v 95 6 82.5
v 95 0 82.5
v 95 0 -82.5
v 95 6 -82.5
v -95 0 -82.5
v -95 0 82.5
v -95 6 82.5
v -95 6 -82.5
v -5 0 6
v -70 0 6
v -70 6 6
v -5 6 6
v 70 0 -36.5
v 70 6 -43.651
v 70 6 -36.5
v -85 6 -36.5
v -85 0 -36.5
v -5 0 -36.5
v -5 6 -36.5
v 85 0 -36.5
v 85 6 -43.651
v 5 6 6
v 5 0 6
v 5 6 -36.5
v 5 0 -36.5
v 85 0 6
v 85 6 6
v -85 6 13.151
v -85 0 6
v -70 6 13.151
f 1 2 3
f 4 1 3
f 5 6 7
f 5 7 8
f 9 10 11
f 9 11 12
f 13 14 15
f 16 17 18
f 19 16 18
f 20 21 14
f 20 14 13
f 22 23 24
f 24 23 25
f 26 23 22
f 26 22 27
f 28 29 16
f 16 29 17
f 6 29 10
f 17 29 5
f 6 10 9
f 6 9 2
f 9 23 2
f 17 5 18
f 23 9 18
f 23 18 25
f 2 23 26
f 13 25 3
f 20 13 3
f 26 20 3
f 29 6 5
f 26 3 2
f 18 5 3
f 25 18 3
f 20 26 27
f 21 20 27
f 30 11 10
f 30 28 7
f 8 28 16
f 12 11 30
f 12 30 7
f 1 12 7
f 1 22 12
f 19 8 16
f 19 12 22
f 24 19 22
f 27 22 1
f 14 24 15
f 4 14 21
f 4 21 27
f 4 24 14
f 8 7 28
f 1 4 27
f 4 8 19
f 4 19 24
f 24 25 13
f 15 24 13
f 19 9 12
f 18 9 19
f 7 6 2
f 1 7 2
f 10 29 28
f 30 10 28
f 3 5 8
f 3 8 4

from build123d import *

# Parameters (mm, degrees)
SKETCH1_W           = 190
SKETCH1_H           = 165
SKETCH1_W_2         = 80
SKETCH1_H_2         = 42.5
BOSS_EXTRUDE1_DEPTH = 6
CUT_EXTRUDE1_DEPTH  = 15
CUT_EXTRUDE2_DEPTH  = 15


with BuildPart() as part:
    # Sketch1 → Boss-Extrude1 (new body)
    with BuildSketch(Plane(origin=(0, 0, 0), x_dir=(1, 0, 0), z_dir=(0, 1, 0))):
        Rectangle(SKETCH1_W, SKETCH1_H)
        with Locations((45, 15.25)):
            Rectangle(SKETCH1_W_2, SKETCH1_H_2, mode=Mode.SUBTRACT)
        with Locations((-45, 15.25)):
            Rectangle(SKETCH1_W_2, SKETCH1_H_2, mode=Mode.SUBTRACT)
    extrude(amount=BOSS_EXTRUDE1_DEPTH)

    # Sketch2 → Cut-Extrude1 (cut)
    with BuildSketch(Plane.ZY.offset(-85)):
        Polygon((-43.650521556, 6), (-36.5, 0), (-36.5, 6), align=None)
    extrude(amount=CUT_EXTRUDE1_DEPTH, mode=Mode.SUBTRACT)

    # Sketch3 → Cut-Extrude2 (cut)
    with BuildSketch(Plane(origin=(-85, 0, 0), x_dir=(0, 0, -1), z_dir=(1, 0, 0))):
        Polygon((-6, 0), (-13.150521556, 6), (-6, 6), align=None)
    extrude(amount=CUT_EXTRUDE2_DEPTH, mode=Mode.SUBTRACT)


solid = part.part
